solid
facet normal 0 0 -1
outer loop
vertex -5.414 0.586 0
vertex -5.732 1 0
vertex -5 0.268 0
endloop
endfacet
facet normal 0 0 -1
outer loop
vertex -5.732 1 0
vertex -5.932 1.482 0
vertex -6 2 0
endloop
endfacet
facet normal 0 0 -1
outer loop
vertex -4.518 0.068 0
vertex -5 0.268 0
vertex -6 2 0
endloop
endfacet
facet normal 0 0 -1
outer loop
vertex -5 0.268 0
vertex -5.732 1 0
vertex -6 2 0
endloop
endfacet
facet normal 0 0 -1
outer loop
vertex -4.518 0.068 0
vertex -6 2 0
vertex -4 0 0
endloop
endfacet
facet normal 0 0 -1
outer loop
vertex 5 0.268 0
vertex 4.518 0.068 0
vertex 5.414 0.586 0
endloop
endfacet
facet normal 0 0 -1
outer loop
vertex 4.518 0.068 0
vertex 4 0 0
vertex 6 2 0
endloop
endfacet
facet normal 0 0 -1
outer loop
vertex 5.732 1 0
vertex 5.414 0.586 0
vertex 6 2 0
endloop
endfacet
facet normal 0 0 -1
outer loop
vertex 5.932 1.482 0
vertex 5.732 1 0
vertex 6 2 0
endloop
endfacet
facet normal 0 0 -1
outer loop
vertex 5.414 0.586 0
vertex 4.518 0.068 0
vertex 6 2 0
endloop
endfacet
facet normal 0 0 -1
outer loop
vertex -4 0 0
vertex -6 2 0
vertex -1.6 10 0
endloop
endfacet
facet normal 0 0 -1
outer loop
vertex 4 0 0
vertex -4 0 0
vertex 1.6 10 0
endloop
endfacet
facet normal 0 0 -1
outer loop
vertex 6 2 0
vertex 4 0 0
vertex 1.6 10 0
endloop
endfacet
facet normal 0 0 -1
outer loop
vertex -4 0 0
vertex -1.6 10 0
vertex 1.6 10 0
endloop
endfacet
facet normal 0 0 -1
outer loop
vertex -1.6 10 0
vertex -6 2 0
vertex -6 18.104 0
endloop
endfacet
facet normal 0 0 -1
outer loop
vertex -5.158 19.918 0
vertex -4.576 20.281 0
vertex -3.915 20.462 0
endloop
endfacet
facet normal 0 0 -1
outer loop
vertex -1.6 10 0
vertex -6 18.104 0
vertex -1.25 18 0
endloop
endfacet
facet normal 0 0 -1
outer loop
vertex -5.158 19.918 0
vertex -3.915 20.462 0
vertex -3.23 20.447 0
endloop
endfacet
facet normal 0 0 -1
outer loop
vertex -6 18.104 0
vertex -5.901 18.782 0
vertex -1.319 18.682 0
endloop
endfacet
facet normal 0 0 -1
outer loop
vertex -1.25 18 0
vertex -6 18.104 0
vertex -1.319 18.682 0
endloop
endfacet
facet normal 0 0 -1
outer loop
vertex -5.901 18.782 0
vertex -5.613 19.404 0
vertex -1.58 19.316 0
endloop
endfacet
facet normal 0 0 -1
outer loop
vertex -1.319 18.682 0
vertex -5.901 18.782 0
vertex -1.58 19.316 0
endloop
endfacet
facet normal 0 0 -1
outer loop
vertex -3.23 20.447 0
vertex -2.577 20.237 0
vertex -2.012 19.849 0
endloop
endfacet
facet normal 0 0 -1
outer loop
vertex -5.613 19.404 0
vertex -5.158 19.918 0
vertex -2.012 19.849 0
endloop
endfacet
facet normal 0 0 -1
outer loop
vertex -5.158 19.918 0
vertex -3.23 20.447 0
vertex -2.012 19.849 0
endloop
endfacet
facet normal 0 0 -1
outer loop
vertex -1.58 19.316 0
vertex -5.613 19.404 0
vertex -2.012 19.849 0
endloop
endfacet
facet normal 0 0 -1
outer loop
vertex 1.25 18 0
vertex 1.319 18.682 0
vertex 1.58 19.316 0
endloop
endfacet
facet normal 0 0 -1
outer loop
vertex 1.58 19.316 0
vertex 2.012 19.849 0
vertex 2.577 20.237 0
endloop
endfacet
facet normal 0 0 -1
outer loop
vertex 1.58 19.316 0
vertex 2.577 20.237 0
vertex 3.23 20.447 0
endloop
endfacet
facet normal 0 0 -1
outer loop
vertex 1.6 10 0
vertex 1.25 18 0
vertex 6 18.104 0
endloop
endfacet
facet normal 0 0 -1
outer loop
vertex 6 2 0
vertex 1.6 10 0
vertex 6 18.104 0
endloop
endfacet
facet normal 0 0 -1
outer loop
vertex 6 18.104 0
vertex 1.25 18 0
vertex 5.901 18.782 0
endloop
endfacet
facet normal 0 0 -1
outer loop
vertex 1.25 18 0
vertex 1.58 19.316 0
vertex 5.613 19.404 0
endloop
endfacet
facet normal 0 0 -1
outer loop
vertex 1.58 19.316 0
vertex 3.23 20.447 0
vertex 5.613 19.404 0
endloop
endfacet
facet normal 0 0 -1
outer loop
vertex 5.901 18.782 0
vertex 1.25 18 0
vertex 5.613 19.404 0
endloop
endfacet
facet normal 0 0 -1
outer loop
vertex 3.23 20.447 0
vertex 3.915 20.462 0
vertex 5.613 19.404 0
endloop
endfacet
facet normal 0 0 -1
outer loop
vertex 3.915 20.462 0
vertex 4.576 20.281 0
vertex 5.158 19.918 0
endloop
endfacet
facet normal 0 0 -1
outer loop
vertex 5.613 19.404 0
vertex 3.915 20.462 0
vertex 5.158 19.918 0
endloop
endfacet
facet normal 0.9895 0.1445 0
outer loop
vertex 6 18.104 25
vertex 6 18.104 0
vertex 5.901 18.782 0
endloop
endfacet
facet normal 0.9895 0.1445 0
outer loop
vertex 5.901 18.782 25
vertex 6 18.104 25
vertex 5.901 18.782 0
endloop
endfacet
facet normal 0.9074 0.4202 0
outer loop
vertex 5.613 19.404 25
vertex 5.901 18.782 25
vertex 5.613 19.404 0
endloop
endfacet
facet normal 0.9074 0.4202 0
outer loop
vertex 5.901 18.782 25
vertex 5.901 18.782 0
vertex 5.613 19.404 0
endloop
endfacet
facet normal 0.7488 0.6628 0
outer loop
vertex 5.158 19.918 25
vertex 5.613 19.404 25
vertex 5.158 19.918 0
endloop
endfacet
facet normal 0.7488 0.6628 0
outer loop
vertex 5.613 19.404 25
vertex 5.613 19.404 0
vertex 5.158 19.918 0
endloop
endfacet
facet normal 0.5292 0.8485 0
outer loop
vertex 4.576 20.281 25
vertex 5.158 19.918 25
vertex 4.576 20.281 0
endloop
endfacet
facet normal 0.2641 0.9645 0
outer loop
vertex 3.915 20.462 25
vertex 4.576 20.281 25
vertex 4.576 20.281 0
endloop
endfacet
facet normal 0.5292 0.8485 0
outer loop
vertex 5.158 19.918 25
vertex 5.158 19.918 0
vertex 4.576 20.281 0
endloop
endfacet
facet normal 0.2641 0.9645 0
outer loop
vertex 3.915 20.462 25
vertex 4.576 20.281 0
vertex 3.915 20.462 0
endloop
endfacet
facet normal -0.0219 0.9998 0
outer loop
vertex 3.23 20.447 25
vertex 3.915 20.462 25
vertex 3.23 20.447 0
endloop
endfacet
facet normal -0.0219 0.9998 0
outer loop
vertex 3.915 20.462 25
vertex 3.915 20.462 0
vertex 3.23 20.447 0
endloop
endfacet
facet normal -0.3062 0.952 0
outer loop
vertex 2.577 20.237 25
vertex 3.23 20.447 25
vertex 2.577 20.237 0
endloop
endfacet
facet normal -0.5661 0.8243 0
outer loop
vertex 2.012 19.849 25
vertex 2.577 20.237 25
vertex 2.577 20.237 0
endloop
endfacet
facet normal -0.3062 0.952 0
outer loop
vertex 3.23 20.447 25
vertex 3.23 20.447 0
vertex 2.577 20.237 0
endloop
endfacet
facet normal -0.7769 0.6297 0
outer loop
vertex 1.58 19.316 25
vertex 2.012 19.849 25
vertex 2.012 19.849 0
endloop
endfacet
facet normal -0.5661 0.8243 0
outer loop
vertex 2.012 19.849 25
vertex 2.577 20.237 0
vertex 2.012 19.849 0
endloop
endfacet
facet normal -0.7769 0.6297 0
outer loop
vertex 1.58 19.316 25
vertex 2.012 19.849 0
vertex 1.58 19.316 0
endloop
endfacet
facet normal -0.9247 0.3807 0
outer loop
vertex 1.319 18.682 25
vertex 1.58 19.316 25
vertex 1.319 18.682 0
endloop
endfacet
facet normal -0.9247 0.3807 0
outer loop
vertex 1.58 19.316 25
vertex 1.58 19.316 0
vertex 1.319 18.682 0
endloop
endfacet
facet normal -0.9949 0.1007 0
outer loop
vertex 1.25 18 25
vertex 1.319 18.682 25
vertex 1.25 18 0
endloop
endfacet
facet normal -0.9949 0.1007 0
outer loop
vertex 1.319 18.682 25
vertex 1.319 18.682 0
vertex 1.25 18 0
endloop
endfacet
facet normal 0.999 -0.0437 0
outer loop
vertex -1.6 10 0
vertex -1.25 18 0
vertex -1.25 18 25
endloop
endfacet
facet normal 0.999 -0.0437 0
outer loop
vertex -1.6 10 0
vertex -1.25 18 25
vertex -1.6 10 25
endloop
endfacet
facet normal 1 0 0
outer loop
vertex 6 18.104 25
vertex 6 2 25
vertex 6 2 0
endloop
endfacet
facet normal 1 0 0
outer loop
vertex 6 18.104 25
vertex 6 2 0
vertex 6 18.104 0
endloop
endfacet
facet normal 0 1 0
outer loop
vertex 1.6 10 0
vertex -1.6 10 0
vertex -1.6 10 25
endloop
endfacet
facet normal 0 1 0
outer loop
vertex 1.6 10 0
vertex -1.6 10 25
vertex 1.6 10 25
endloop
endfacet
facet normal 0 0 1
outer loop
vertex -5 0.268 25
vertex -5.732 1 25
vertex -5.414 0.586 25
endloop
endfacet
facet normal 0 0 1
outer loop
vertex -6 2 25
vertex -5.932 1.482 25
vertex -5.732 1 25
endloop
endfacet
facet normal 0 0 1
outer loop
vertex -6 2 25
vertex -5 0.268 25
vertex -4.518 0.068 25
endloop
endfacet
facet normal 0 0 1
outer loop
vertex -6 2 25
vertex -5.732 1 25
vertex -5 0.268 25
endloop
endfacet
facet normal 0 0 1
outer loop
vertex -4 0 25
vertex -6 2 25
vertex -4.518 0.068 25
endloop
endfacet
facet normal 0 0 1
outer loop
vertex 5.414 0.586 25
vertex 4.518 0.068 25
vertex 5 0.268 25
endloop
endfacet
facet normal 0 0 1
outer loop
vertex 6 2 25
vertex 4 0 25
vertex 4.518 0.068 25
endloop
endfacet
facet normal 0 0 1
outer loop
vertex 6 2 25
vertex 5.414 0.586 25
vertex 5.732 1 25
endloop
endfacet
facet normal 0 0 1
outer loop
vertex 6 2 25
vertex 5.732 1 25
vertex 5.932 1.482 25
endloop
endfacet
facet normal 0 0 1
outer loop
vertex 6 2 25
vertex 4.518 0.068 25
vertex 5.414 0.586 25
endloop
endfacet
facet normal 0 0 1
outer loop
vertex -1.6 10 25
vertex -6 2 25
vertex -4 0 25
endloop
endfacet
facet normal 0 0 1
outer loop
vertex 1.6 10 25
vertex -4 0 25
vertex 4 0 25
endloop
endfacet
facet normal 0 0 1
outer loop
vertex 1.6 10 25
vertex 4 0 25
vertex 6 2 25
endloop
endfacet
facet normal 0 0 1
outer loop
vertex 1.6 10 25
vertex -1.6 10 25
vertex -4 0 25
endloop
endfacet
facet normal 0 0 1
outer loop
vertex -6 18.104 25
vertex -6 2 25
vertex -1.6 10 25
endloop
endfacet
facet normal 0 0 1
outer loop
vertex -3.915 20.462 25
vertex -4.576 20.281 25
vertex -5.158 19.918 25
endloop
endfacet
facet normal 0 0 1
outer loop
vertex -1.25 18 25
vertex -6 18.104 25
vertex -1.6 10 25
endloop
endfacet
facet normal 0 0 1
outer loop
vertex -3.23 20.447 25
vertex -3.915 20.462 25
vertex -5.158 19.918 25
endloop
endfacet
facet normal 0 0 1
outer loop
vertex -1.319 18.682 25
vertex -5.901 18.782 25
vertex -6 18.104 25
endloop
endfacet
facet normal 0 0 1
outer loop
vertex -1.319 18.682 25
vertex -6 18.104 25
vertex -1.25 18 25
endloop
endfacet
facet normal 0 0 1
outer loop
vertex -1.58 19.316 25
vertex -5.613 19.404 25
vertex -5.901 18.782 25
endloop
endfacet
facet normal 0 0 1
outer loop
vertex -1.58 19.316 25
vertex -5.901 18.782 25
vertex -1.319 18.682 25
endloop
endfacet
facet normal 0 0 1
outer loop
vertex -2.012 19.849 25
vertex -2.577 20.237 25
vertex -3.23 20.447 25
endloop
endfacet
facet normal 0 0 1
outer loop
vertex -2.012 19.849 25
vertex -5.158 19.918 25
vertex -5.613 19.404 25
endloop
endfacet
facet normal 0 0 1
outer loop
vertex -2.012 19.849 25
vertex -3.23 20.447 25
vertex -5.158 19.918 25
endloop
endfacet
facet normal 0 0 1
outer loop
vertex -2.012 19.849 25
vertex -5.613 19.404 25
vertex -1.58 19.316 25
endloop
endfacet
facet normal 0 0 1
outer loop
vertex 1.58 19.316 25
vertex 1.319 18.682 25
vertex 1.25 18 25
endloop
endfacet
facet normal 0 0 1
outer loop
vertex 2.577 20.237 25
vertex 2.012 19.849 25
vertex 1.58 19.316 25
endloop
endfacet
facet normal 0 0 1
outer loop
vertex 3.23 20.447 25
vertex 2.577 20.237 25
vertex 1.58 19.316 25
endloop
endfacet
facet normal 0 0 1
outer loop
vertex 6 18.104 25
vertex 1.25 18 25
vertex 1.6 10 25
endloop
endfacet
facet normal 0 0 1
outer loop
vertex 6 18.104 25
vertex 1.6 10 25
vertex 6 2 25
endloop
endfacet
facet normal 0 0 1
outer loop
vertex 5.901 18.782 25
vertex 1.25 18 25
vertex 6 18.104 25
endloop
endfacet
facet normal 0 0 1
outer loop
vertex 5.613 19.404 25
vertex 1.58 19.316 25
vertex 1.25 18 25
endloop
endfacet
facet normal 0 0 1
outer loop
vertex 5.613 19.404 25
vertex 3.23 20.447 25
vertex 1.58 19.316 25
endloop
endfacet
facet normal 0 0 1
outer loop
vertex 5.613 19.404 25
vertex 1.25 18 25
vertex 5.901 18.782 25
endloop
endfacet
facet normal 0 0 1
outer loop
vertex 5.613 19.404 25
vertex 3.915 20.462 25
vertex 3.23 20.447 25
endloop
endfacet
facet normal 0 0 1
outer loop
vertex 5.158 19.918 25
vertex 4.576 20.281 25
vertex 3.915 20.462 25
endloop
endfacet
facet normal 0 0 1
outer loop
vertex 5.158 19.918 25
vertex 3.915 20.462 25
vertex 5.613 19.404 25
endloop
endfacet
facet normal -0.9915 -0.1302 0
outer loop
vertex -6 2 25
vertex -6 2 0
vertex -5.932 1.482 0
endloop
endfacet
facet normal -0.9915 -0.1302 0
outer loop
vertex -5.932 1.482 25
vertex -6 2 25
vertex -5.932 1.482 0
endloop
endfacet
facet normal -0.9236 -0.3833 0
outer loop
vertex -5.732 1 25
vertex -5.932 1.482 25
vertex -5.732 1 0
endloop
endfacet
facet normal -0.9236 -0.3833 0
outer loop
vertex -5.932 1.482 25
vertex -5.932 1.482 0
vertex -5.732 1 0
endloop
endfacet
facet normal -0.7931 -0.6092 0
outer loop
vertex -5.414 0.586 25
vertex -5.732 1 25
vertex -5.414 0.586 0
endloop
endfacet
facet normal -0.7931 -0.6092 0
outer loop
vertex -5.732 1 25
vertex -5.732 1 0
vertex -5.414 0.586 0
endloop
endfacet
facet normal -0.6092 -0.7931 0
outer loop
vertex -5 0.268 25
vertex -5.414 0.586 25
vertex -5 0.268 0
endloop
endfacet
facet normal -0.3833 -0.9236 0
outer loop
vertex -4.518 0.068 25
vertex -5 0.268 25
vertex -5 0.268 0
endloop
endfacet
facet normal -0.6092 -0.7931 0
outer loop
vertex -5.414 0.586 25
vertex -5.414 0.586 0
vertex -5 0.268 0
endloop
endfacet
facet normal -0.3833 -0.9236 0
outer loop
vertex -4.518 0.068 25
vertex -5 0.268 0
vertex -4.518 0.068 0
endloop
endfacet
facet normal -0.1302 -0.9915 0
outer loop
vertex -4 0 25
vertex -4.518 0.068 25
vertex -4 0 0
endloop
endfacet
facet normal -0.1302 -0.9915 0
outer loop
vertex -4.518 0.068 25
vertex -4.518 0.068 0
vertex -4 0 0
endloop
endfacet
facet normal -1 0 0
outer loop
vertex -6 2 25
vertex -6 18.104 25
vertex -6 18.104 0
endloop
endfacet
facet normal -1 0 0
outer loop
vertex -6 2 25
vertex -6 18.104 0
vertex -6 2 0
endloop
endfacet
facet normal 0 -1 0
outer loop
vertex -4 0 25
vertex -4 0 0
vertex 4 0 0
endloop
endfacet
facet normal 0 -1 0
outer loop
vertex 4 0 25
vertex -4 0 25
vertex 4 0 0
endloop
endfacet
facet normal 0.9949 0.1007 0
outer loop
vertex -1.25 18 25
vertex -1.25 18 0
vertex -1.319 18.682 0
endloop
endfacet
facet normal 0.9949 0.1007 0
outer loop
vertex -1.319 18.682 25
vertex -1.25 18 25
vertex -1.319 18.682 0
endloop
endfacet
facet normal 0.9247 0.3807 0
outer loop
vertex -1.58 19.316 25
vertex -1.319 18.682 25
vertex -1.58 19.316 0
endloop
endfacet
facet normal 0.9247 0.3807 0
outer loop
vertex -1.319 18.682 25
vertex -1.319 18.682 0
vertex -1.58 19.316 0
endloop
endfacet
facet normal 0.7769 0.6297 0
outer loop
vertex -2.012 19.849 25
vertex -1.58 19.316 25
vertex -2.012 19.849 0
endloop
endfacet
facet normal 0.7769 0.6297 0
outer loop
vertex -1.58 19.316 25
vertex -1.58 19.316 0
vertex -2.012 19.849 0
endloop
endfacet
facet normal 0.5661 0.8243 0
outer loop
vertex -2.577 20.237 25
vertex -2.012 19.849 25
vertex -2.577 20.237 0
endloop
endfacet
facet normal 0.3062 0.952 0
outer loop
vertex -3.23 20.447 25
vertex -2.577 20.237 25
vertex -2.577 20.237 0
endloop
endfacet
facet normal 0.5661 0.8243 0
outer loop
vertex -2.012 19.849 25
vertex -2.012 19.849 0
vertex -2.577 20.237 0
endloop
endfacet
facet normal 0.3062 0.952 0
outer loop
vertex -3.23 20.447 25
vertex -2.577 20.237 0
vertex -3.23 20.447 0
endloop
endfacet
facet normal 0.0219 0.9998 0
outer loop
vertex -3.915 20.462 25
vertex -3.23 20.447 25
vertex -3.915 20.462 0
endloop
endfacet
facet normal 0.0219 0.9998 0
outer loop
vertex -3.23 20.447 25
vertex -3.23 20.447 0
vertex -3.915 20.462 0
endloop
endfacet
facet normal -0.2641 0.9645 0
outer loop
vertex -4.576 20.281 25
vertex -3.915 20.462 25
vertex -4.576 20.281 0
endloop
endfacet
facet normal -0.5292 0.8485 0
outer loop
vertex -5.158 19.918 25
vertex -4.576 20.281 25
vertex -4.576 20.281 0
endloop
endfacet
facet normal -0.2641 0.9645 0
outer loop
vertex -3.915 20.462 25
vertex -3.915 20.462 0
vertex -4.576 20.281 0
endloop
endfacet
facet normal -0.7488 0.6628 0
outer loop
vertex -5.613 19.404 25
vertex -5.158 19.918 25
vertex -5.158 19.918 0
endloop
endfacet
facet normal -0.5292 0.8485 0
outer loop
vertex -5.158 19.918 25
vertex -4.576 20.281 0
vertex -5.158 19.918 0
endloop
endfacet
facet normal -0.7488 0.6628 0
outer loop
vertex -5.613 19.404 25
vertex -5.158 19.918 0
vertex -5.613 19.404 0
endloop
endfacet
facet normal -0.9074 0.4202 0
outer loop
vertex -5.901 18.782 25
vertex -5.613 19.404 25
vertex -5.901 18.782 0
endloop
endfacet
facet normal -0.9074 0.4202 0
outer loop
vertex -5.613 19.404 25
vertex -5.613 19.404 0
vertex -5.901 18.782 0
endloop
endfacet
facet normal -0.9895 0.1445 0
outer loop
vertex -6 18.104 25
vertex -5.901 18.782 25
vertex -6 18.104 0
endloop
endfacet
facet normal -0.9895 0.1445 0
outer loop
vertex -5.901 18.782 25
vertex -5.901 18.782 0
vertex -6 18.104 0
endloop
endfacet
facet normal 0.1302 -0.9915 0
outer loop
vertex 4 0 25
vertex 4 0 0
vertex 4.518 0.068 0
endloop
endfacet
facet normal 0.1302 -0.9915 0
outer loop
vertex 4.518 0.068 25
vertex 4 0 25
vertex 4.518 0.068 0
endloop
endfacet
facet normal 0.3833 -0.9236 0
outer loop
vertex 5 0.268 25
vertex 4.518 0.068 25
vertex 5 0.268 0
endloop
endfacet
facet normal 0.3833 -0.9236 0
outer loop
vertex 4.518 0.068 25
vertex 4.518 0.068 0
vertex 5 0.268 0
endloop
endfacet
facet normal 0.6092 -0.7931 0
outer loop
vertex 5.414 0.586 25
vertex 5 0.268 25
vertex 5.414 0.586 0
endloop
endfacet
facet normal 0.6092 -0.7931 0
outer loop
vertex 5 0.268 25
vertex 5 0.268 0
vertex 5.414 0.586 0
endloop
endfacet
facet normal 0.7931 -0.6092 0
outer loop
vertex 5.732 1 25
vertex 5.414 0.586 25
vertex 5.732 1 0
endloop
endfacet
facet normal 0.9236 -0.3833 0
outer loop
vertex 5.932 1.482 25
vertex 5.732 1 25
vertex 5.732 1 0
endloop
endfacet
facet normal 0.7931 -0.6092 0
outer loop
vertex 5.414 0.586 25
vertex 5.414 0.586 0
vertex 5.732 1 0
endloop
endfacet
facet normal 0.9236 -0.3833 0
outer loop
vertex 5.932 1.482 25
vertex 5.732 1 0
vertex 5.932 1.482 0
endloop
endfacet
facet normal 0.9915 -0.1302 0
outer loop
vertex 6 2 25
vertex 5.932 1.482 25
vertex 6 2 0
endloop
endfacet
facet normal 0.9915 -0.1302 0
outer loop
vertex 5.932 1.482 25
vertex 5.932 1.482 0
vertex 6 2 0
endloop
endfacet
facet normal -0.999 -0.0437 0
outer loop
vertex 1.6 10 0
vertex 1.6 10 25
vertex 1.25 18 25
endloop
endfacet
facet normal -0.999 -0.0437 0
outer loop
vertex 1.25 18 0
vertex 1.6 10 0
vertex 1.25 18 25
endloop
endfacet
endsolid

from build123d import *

# Parameters (mm, degrees)
PAD_DEPTH = 25


with BuildPart() as part:
    # Sketch → Pad (new body)
    with BuildSketch(Plane.XY):
        with BuildLine():
            Line((-6, 18.103857), (-6, 2))
            ThreePointArc((-6, 2), (-5.414214, 0.585786), (-4, 0))
            Line((-4, 0), (4, 0))
            ThreePointArc((4, 0), (5.414214, 0.585786), (6, 2))
            Line((6, 2), (6, 18.103857))
            ThreePointArc((6, 18.103857), (3.571924, 20.479424), (1.25, 18))
            Line((1.6, 10), (1.25, 18))
            Line((-1.6, 10), (1.6, 10))
            Line((-1.25, 18), (-1.6, 10))
            ThreePointArc((-1.25, 18), (-3.571924, 20.479424), (-6, 18.103857))
        make_face()
    extrude(amount=PAD_DEPTH)


solid = part.part
